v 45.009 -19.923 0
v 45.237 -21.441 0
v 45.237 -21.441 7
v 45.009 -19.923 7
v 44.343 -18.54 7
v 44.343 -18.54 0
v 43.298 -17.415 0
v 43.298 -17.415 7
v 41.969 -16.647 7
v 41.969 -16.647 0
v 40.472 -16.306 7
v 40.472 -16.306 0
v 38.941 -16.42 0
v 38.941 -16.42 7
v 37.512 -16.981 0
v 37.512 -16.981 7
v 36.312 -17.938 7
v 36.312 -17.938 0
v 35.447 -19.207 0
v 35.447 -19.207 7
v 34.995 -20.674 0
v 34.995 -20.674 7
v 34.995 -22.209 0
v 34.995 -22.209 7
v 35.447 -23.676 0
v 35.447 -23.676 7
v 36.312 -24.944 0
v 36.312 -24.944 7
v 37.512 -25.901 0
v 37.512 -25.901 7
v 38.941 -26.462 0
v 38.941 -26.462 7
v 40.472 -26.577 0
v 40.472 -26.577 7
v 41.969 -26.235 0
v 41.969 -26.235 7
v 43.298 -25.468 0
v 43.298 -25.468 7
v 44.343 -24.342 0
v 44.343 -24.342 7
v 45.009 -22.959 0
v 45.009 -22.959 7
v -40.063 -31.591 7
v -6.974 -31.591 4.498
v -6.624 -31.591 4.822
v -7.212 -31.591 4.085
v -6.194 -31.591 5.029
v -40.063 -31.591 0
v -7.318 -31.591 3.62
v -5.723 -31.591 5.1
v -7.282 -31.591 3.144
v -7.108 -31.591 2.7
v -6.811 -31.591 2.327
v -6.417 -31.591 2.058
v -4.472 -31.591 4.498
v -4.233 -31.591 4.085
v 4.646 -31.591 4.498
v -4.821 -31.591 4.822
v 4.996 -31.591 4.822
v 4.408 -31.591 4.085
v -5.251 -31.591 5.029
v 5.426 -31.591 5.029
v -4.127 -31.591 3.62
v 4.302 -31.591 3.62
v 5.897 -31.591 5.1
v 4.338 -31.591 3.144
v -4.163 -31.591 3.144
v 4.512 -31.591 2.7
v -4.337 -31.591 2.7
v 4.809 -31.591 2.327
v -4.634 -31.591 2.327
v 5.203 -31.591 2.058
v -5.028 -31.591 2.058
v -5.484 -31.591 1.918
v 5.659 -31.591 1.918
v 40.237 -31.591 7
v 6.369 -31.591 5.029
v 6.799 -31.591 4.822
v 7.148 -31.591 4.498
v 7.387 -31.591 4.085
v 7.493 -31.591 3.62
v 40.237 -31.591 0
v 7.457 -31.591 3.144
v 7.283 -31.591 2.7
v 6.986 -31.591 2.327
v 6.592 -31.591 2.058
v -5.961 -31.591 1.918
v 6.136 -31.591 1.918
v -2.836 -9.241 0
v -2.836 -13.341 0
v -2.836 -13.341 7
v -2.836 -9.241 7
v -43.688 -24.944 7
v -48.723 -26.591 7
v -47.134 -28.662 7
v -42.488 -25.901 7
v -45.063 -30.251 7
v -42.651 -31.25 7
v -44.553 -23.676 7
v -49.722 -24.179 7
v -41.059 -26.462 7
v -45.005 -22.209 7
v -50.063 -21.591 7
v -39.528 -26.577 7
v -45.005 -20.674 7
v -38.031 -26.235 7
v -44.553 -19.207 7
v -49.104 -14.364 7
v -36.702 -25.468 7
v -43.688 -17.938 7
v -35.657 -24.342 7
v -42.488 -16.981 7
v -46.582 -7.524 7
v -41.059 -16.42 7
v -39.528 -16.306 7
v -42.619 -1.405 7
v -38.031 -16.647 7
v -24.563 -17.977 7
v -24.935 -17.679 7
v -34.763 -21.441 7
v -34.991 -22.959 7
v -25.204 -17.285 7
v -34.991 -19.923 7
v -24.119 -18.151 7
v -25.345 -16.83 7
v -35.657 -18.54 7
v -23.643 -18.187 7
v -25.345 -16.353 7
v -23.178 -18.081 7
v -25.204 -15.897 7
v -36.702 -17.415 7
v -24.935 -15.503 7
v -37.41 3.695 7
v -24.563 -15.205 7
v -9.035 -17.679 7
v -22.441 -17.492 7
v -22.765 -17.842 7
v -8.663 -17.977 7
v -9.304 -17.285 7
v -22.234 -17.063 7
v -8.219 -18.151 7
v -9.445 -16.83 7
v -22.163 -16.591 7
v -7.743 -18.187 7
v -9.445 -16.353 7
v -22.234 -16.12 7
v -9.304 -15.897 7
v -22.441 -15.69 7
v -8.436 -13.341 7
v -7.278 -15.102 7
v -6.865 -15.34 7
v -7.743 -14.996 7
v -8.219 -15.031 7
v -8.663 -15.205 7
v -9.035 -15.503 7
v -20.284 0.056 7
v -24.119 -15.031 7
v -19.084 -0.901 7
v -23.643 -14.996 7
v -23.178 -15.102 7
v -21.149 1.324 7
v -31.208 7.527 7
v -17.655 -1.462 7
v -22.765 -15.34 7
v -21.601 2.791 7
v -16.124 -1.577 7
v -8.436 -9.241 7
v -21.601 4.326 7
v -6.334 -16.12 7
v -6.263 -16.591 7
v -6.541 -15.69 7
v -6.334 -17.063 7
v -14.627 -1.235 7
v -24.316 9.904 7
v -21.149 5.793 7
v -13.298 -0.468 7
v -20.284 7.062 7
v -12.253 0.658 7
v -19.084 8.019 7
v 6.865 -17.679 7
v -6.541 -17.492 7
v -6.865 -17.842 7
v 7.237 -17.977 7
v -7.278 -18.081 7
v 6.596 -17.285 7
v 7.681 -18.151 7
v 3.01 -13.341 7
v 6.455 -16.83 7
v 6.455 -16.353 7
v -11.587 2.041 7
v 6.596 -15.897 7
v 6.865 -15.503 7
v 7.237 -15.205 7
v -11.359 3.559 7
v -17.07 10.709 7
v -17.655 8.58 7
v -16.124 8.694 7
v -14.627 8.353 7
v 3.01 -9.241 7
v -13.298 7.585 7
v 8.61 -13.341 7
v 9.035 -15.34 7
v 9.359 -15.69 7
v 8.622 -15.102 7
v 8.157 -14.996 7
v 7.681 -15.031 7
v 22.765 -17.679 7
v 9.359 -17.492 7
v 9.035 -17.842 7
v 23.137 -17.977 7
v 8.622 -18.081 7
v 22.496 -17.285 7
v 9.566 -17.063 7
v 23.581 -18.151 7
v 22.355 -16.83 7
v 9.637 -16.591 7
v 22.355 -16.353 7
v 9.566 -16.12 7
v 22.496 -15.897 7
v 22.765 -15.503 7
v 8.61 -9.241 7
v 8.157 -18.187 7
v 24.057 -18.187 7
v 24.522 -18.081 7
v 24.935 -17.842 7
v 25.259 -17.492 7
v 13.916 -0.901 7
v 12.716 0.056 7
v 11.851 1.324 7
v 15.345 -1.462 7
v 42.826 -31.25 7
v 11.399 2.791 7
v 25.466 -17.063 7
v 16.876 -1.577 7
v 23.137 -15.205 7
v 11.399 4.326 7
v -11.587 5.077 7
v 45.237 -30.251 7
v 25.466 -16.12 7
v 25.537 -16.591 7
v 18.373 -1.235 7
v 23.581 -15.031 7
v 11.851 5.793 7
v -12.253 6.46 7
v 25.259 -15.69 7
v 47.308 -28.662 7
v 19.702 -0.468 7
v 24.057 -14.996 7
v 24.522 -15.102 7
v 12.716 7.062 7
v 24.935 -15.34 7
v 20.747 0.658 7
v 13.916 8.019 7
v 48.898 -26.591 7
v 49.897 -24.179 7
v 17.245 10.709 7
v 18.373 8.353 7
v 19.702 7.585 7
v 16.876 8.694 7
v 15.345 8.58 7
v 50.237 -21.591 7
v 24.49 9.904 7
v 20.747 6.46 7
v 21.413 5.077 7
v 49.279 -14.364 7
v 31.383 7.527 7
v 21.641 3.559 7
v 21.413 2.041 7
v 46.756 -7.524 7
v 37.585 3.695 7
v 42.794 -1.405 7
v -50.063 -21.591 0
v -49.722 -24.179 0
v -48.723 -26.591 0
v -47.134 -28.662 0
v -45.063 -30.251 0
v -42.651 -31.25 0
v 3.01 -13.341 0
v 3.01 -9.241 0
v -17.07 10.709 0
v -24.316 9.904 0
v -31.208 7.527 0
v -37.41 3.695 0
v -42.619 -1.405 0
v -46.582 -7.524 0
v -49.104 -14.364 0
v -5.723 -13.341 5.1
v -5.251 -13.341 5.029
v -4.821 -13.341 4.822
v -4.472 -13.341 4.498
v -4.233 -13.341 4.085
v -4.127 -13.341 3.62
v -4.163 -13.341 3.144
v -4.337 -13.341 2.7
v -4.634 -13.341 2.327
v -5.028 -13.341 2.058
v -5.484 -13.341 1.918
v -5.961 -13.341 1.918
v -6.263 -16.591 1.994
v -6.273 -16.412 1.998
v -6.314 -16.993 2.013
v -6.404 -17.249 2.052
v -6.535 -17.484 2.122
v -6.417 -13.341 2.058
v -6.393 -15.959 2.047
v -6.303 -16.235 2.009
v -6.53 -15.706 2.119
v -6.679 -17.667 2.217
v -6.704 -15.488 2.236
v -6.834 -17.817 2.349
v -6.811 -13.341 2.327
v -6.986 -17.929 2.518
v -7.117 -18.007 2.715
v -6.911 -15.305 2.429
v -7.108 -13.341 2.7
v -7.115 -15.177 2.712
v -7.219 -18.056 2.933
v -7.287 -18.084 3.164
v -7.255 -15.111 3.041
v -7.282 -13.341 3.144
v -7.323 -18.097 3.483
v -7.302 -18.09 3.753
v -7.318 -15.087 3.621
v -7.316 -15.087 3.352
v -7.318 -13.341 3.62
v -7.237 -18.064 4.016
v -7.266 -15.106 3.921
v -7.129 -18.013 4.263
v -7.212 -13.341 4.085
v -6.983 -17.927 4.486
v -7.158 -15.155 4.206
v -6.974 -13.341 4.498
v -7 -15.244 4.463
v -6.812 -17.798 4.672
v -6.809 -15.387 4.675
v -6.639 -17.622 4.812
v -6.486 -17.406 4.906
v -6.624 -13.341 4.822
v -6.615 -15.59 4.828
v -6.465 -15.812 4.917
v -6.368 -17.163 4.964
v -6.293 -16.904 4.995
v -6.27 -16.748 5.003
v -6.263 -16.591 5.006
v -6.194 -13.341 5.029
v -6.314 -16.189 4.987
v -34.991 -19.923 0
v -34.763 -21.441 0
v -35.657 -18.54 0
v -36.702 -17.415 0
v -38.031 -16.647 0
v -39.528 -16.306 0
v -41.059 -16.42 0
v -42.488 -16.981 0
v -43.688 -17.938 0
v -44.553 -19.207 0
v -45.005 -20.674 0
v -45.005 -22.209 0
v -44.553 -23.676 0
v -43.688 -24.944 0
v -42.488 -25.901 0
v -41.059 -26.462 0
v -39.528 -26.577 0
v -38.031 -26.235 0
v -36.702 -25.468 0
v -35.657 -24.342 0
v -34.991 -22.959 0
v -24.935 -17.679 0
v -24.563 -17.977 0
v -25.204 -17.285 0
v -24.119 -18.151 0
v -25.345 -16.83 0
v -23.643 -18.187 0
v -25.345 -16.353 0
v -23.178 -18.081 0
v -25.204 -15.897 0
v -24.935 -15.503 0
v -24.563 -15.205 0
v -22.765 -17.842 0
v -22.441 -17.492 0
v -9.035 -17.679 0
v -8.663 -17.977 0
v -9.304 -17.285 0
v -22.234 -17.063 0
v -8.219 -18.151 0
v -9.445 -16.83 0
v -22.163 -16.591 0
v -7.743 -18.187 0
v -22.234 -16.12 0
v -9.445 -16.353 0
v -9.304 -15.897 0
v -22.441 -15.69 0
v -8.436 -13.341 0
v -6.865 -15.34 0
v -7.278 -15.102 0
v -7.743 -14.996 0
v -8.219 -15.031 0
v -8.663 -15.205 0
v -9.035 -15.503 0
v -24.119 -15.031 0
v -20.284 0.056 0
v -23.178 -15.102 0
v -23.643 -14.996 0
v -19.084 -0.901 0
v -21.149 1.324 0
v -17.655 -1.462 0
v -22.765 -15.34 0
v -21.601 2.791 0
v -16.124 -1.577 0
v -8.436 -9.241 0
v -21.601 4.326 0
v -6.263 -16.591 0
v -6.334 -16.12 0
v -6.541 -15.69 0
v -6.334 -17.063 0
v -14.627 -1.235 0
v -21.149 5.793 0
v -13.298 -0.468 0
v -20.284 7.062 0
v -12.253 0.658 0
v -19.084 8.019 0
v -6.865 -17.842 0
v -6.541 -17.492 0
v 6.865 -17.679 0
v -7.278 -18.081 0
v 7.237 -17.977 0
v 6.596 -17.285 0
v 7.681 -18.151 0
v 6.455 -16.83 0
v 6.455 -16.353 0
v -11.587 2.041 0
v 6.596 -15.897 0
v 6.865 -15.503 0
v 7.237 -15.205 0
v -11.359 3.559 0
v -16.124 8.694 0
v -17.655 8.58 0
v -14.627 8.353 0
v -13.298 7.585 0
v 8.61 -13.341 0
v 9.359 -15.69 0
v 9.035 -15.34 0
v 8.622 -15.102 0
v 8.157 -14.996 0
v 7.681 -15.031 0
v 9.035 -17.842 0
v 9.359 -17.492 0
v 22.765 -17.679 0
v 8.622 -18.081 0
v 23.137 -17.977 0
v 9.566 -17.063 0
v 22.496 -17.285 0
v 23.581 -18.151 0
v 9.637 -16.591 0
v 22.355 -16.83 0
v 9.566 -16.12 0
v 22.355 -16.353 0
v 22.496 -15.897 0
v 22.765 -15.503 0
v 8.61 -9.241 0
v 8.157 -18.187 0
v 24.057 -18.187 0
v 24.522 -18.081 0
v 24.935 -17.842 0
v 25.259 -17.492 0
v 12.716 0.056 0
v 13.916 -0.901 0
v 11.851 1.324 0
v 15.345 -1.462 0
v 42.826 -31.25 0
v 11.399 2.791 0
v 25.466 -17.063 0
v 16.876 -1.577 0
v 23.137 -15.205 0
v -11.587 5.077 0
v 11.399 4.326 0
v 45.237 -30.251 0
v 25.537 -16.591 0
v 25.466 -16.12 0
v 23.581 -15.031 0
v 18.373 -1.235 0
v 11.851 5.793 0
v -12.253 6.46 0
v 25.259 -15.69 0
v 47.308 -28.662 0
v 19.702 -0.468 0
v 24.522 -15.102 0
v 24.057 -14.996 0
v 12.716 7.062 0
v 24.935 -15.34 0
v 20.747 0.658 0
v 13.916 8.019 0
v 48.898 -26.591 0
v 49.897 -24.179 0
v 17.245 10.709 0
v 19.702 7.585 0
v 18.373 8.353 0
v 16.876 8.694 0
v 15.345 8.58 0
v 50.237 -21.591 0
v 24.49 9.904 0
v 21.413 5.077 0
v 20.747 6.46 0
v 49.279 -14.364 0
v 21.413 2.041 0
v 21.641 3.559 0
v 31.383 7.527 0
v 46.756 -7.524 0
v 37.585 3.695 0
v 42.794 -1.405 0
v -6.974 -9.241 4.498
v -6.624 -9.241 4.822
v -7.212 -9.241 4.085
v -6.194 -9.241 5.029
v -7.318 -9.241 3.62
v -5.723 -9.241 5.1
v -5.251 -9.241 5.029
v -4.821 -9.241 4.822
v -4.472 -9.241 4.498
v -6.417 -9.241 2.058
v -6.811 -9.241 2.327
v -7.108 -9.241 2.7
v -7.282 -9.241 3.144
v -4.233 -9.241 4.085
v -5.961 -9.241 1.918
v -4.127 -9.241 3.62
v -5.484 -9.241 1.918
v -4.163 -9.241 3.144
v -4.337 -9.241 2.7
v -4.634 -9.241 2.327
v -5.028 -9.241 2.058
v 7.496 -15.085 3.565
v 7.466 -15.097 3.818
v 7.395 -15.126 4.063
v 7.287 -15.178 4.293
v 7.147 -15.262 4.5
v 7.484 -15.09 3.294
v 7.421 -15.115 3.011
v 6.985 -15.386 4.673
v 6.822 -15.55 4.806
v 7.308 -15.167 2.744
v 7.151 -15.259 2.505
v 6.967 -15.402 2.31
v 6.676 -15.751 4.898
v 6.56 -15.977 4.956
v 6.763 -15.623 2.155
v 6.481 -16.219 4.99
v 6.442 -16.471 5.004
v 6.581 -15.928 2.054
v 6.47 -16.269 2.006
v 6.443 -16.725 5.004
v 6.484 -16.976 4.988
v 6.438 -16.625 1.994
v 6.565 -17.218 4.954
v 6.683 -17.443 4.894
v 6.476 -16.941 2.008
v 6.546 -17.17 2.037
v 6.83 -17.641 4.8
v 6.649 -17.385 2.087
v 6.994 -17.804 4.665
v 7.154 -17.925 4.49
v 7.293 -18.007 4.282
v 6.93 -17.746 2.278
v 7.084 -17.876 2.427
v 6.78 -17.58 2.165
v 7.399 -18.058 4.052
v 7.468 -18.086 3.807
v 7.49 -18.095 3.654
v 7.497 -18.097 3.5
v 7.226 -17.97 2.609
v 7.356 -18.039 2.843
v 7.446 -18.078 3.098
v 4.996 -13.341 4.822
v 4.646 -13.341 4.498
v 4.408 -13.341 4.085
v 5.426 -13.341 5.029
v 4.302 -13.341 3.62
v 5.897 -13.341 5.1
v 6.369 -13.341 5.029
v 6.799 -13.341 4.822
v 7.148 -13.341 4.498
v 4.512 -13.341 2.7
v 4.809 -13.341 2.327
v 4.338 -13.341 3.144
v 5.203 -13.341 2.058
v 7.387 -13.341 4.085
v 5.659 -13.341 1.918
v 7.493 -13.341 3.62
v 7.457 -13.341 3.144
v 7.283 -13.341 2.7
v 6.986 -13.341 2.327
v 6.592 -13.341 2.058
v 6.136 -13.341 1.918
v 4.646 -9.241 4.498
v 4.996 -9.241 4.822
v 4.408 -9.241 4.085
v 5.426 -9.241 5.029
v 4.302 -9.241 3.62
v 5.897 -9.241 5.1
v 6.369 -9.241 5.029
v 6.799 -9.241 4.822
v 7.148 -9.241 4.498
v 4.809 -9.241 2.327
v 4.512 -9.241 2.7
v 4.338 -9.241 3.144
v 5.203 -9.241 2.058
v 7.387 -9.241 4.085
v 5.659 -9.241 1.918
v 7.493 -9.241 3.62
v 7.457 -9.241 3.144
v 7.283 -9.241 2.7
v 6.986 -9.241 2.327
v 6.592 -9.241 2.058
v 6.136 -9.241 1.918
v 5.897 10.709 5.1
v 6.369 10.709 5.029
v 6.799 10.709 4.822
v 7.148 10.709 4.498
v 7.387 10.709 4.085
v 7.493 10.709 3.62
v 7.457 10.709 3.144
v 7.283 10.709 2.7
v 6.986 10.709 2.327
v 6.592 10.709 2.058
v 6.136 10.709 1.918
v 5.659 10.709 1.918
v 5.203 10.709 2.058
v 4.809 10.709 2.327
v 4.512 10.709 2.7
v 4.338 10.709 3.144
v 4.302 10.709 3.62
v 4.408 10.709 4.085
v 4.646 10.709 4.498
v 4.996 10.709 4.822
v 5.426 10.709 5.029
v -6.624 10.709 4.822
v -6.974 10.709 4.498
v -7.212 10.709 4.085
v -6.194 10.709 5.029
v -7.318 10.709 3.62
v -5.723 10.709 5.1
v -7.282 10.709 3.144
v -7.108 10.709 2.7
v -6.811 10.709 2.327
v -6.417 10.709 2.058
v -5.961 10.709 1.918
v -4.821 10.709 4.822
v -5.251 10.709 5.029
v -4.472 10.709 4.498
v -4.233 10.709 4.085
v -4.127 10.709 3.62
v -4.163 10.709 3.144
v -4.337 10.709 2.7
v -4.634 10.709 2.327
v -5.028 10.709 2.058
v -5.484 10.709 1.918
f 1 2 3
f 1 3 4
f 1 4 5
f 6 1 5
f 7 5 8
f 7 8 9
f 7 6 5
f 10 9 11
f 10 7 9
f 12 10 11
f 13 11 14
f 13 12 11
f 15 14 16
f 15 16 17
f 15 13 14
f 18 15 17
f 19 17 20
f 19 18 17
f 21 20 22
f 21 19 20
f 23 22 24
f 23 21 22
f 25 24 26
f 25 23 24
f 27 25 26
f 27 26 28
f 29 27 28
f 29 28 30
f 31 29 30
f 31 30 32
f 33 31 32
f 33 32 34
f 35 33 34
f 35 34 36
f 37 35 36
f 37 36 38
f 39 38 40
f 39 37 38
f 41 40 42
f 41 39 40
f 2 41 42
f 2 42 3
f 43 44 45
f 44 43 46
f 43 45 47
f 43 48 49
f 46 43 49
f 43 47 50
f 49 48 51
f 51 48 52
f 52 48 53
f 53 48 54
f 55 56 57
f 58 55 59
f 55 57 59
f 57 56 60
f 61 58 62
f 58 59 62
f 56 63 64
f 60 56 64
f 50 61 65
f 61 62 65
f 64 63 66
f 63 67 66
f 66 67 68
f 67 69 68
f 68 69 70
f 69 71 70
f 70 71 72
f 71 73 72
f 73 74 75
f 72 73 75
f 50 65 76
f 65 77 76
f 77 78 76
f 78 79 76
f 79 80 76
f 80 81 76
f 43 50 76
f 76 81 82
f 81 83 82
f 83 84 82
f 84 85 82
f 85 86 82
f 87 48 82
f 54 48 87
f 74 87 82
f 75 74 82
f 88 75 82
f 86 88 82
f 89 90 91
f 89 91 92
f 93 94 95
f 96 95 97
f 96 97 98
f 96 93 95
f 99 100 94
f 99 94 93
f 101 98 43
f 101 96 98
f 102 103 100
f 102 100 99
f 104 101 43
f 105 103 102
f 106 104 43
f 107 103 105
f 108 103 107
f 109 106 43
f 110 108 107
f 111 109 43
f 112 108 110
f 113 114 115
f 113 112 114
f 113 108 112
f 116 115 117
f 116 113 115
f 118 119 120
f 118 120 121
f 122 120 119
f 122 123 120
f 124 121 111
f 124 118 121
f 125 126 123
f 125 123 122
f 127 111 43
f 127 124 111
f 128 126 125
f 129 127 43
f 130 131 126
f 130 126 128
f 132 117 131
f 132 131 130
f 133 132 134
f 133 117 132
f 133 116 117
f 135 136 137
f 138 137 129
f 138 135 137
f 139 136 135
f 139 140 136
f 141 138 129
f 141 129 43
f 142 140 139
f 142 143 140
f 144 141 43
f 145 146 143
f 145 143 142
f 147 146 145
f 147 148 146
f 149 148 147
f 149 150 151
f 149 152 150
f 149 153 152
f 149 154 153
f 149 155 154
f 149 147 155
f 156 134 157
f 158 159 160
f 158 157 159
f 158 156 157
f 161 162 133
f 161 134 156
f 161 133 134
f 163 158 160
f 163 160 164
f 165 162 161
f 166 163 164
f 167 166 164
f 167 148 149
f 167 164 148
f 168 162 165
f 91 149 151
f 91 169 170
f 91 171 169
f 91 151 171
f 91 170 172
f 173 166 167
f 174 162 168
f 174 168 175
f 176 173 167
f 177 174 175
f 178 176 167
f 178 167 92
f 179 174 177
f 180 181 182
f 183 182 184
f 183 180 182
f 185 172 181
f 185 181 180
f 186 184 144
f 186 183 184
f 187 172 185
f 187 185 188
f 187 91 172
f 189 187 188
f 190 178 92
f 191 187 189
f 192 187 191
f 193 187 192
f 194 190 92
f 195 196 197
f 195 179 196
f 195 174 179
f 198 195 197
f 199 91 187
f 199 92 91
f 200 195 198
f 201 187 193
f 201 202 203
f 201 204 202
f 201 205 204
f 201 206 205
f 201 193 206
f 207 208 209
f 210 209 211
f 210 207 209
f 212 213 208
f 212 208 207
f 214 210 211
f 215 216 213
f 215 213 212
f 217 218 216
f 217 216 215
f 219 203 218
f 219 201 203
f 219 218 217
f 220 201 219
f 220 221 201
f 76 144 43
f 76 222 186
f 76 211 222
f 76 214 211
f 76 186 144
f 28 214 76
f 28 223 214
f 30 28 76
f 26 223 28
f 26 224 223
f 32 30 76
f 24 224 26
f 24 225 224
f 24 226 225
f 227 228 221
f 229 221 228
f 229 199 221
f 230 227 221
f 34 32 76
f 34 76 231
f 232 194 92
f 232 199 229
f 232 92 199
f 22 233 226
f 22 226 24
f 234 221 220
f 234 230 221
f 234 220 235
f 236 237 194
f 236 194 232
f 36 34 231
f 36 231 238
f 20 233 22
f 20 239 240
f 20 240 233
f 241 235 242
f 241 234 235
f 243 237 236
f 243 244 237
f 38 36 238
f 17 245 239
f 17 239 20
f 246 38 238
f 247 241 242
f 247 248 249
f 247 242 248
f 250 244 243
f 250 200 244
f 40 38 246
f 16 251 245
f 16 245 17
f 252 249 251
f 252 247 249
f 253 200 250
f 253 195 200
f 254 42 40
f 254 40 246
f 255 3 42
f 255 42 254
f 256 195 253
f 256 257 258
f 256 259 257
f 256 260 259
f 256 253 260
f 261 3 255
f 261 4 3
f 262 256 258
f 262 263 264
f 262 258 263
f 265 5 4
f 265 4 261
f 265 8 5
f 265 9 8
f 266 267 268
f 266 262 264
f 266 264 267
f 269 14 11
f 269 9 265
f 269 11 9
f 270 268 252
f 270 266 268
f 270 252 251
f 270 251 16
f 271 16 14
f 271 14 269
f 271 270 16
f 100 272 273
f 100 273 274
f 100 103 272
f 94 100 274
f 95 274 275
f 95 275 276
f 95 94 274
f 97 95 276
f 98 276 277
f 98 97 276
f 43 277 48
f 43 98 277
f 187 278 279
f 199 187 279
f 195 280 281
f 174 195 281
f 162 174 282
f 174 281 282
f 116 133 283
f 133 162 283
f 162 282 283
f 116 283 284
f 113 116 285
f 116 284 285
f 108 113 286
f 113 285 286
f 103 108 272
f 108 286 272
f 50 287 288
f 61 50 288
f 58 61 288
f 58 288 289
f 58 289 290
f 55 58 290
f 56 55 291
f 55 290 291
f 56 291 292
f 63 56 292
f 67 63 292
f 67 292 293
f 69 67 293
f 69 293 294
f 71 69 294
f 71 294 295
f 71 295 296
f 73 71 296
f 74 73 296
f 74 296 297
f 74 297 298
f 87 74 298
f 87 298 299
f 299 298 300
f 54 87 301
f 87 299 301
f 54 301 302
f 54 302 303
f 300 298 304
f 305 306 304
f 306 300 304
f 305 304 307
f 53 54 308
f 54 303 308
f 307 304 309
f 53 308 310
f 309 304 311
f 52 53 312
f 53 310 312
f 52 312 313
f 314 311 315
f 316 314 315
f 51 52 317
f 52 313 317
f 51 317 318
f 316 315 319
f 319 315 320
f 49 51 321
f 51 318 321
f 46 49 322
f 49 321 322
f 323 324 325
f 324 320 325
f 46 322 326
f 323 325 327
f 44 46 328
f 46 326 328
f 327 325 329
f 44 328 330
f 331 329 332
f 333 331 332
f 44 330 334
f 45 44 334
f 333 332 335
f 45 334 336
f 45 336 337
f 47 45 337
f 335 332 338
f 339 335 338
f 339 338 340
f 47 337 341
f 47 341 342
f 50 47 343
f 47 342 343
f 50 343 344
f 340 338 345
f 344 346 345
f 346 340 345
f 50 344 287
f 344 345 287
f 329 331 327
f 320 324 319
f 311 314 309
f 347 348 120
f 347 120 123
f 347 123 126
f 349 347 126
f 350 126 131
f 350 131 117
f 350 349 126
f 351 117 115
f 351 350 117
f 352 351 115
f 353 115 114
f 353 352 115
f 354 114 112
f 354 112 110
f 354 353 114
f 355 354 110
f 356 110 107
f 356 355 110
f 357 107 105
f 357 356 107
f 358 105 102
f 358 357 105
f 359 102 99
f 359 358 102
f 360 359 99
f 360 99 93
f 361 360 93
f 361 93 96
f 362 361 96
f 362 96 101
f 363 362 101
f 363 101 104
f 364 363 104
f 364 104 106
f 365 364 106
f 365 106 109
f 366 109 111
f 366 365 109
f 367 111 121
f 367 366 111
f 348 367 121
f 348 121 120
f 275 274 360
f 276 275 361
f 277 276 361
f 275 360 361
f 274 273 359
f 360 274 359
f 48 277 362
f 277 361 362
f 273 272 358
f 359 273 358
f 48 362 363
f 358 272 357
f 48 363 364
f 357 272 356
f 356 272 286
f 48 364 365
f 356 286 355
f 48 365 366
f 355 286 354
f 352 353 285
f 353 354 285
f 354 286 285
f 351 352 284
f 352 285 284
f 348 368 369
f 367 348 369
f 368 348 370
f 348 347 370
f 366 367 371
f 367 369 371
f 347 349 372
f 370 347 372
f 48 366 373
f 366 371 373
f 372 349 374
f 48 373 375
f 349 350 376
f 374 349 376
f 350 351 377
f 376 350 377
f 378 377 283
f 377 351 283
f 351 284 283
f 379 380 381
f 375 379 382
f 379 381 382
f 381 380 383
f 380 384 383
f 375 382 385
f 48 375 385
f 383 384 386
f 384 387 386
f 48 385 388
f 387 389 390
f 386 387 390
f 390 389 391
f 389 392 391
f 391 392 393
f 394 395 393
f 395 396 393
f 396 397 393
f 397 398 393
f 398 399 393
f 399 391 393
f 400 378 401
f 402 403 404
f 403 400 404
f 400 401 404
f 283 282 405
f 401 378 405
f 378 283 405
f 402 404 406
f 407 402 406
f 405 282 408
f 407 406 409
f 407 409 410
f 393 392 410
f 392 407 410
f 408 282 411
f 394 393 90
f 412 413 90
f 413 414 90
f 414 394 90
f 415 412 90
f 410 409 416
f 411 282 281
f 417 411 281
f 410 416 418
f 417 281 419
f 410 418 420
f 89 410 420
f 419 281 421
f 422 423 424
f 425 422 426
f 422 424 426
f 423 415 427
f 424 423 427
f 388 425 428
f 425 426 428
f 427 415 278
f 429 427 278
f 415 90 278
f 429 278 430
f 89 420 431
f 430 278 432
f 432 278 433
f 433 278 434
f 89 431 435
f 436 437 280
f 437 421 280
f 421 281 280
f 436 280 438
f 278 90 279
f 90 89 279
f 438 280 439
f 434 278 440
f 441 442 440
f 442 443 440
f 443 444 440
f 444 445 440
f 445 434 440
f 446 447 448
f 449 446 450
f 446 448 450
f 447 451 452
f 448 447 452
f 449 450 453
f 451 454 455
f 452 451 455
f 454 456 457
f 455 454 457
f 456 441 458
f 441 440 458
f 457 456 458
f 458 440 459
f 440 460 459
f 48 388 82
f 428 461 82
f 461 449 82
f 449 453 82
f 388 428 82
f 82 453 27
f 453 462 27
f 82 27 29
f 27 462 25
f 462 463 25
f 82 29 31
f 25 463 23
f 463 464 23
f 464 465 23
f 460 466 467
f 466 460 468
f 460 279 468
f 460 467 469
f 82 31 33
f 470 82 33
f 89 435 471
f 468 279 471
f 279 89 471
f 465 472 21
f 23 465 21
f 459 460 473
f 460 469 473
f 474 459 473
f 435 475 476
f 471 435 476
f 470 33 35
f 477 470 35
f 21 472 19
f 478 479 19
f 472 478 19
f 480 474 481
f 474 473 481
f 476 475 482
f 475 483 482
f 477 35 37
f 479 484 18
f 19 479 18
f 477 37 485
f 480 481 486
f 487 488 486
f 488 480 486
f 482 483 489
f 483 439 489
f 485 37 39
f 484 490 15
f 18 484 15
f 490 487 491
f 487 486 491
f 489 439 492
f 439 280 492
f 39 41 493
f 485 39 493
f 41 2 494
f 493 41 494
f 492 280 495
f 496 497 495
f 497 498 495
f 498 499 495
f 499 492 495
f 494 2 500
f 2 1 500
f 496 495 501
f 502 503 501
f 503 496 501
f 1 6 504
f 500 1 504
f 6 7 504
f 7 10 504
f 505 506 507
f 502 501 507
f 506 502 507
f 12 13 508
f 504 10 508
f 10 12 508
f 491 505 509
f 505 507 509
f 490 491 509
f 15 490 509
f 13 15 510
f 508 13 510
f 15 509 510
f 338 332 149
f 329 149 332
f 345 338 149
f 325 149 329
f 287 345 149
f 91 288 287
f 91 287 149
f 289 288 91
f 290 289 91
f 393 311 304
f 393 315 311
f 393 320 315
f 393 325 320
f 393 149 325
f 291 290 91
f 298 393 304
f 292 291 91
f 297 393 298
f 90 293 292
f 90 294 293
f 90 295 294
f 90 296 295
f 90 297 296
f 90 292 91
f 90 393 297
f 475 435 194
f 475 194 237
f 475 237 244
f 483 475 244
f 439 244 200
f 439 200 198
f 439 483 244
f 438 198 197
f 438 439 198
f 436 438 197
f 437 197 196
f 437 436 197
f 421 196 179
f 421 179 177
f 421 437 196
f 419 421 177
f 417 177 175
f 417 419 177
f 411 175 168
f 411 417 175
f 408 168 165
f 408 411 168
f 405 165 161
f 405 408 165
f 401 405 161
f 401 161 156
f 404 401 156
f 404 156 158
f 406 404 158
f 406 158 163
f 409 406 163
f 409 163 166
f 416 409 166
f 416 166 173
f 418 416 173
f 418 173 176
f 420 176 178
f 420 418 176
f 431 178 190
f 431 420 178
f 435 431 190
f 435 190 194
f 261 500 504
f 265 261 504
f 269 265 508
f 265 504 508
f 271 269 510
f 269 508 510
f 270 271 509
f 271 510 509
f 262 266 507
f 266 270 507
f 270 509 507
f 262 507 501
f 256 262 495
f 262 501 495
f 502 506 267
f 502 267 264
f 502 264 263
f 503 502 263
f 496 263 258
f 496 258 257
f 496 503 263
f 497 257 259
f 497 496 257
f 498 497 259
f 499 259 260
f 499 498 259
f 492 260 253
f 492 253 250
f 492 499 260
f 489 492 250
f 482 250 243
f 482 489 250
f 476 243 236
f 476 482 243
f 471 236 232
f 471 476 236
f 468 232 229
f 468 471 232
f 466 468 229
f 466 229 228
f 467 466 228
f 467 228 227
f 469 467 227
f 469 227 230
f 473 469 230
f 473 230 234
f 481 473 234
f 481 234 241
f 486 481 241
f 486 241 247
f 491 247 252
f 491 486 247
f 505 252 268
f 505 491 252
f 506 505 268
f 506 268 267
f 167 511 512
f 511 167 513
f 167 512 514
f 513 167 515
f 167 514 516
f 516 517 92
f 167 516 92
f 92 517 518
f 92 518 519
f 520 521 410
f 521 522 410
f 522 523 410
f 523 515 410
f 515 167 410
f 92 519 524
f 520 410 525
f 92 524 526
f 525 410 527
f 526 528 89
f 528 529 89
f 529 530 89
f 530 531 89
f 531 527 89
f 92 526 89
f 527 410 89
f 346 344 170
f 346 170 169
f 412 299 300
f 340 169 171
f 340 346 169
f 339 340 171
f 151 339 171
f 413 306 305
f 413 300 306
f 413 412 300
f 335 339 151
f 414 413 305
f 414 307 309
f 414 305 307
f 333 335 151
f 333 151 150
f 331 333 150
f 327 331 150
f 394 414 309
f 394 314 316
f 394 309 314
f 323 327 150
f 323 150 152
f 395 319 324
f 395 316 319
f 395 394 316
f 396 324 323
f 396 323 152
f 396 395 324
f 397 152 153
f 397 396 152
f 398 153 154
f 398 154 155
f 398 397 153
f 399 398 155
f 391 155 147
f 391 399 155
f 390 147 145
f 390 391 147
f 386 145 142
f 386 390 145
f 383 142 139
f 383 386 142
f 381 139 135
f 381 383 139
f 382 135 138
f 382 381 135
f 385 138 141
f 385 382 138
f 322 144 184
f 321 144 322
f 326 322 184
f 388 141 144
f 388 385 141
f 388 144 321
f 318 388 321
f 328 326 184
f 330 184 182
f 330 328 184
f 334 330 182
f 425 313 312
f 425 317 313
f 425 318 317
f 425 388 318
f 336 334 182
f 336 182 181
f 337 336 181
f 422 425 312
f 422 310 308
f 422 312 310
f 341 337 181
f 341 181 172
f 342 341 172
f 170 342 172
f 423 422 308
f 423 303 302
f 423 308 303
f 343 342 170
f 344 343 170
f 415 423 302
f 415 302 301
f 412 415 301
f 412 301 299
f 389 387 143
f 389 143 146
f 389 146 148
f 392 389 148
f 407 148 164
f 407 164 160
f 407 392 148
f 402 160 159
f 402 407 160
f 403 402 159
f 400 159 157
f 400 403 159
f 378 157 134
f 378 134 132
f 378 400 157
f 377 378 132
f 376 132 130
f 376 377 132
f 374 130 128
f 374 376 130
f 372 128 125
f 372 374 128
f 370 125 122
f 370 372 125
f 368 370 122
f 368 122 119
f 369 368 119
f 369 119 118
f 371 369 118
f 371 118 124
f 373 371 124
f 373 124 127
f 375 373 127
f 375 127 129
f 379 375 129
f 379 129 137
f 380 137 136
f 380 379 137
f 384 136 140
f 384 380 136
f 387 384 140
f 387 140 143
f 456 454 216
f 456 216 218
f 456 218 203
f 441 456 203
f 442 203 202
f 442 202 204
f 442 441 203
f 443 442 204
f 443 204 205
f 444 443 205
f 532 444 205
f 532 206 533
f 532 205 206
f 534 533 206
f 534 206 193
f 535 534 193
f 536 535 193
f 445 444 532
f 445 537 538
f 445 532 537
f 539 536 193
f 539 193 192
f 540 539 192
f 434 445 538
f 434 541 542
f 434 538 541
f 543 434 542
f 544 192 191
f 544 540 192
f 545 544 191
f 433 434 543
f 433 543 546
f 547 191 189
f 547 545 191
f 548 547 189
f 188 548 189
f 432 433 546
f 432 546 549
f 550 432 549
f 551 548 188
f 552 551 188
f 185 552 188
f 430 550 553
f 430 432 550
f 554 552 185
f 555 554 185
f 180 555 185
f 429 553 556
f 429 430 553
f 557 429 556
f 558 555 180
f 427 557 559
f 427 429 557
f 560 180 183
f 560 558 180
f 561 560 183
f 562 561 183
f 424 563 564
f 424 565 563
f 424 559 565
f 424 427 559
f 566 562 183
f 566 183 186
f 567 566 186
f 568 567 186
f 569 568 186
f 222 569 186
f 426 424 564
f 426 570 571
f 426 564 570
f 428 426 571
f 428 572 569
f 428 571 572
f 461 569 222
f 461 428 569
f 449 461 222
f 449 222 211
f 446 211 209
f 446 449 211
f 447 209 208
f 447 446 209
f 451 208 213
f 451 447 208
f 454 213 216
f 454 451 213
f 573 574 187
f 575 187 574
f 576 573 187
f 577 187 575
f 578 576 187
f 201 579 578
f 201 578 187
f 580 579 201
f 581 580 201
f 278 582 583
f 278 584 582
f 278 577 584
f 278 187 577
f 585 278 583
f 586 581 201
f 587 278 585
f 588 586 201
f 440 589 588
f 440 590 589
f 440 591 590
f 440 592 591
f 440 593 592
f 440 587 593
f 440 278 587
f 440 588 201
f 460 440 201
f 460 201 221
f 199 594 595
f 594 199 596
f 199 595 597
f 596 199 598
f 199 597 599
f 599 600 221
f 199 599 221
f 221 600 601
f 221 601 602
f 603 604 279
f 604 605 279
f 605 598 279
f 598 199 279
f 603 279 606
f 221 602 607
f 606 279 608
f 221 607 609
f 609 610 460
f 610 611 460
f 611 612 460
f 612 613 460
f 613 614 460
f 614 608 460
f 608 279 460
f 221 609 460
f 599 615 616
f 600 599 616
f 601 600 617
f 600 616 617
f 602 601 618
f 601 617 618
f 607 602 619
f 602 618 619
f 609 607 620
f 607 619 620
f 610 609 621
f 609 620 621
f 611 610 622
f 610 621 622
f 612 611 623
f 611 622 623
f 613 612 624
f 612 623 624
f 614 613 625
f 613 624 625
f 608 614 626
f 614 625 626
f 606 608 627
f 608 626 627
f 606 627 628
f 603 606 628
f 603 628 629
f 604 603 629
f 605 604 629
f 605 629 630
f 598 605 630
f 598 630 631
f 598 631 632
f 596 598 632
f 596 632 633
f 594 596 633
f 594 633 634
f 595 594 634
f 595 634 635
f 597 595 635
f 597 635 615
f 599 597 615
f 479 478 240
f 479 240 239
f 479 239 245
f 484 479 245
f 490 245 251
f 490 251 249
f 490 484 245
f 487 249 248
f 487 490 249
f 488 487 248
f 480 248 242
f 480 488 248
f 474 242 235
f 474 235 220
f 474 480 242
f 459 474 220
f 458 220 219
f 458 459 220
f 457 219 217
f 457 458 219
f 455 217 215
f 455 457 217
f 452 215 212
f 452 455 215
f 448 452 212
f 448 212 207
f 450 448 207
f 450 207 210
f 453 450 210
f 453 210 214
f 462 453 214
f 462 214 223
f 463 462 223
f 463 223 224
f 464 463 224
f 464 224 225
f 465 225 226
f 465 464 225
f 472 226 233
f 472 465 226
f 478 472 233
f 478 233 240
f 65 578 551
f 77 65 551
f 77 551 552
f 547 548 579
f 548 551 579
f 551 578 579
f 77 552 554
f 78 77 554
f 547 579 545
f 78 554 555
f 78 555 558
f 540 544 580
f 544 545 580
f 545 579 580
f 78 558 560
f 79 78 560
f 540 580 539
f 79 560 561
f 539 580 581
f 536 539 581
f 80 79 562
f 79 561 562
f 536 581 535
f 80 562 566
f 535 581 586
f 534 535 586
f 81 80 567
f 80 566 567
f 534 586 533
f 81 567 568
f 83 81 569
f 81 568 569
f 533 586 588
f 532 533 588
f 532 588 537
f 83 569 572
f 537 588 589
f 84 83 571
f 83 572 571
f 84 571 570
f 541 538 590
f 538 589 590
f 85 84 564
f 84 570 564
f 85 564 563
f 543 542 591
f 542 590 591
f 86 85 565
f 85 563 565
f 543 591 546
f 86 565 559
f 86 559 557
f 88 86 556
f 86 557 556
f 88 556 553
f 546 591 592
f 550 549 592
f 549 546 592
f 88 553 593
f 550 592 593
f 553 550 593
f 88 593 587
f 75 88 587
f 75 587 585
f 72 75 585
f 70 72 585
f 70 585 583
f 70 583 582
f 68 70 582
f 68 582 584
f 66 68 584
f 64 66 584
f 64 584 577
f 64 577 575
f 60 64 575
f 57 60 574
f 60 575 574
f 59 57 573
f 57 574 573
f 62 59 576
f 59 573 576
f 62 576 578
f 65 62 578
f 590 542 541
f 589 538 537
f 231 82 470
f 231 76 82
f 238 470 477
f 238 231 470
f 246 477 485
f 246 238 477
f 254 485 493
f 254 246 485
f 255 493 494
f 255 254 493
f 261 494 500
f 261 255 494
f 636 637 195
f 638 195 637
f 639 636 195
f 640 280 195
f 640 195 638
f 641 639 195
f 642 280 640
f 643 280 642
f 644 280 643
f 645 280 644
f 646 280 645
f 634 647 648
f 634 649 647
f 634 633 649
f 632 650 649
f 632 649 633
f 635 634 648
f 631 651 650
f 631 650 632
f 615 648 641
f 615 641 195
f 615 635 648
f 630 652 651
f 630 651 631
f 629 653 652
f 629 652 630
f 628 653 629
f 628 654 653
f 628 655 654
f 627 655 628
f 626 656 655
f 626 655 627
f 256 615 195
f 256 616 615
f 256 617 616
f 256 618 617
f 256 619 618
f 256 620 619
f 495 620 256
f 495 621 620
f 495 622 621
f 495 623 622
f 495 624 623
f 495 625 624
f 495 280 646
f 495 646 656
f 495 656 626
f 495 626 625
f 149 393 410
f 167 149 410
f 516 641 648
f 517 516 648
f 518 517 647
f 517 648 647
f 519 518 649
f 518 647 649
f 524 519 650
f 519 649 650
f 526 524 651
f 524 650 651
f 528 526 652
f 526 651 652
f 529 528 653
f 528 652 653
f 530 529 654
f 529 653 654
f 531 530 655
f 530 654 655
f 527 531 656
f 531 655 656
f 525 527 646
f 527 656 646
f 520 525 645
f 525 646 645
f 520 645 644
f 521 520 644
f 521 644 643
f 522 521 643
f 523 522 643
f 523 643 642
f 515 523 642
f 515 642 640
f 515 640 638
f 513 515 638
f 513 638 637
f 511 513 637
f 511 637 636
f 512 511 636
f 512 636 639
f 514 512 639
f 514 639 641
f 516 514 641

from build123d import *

# Parameters (mm, degrees)
ESBO_O1_W                = 100.3
ESBO_O1_H                = 42.3
ESBO_O1_R                = 5.15
ESBO_O1_R_2              = 1.6
ESBO_O1_W_2              = 5.6
ESBO_O1_H_2              = 4.1
RESSALTO_EXTRUS_O1_DEPTH = 7
FILETE1_R                = 10
ESBO_O4_R                = 1.6
CORTE_EXTRUS_O3_DEPTH    = 67.046091306
FILETE3_R                = 33


with BuildPart() as part:
    # Esboço1 → Ressalto-extrusão1 (new body)
    with BuildSketch(Plane.XY):
        with Locations((0.087398189, -10.441132561)):
            Rectangle(ESBO_O1_W, ESBO_O1_H)
        with Locations((-16.508590221, 3.558867439)):
            Circle(ESBO_O1_R, mode=Mode.SUBTRACT)
        with Locations((16.491409779, 3.558867439)):
            Circle(ESBO_O1_R, mode=Mode.SUBTRACT)
        with Locations((-39.912601811, -21.441132561)):
            Circle(ESBO_O1_R, mode=Mode.SUBTRACT)
        with Locations((40.087398189, -21.441132561)):
            Circle(ESBO_O1_R, mode=Mode.SUBTRACT)
        with Locations((8.037398189, -16.591132561)):
            Circle(ESBO_O1_R_2, mode=Mode.SUBTRACT)
        with Locations((23.937398189, -16.591132561)):
            Circle(ESBO_O1_R_2, mode=Mode.SUBTRACT)
        with Locations((-7.862601811, -16.591132561)):
            Circle(ESBO_O1_R_2, mode=Mode.SUBTRACT)
        with Locations((-23.762601811, -16.591132561)):
            Circle(ESBO_O1_R_2, mode=Mode.SUBTRACT)
        with Locations((-5.635596016, -11.291132561)):
            Rectangle(ESBO_O1_W_2, ESBO_O1_H_2, mode=Mode.SUBTRACT)
        with Locations((5.810392394, -11.291132561)):
            Rectangle(ESBO_O1_W_2, ESBO_O1_H_2, mode=Mode.SUBTRACT)
    extrude(amount=RESSALTO_EXTRUS_O1_DEPTH)

    # Filete1
    filete1_edges = [part.edges().sort_by_distance(p)[0] for p in [
        (50.237398189, -31.591132561, 3.5),
        (-50.062601811, -31.591132561, 3.5),
    ]]
    fillet(filete1_edges, radius=FILETE1_R)

    # Esboço4 → Corte-extrusão3 (cut, through all)
    with BuildSketch(Plane(origin=(0, 10.708867439, 0), x_dir=(1, 0, 0), z_dir=(0, 1, 0))):
        with Locations(Location((-5.722601811, -3.5, 0), (0, 0, 270))):
            Circle(ESBO_O4_R)
        with Locations(Location((5.897398189, -3.5, 0), (0, 0, 270))):
            Circle(ESBO_O4_R)
    extrude(amount=-CORTE_EXTRUS_O3_DEPTH, mode=Mode.SUBTRACT)

    # Filete3
    # the kernel refuses this fillet: 33 mm, written as the material it takes off along each edge
    with BuildSketch(Plane(origin=(50.237398189, 10.708867439, -82.481437306), x_dir=(0, -1, 0), z_dir=(0, 0, 1))) as filete3_piece_1:
        with BuildLine():
            CenterArc((33, -32.992574922), FILETE3_R, 91.215456182, 88.784543818)
            Line((0, -32.992574922), (0, 0))
            Line((0, 0), (32.3, 0))
        make_face()
    extrude(amount=171.962874611, mode=Mode.SUBTRACT)
    with BuildSketch(Plane(origin=(-50.062601811, 10.708867439, -82.481437306), x_dir=(0, -1, 0), z_dir=(0, 0, 1))) as filete3_piece_2:
        with BuildLine():
            CenterArc((33, 32.992574922), FILETE3_R, 180, 88.784543818)
            Line((0, 32.992574922), (0, 0))
            Line((0, 0), (32.3, 0))
        make_face()
    extrude(amount=171.962874611, mode=Mode.SUBTRACT)


solid = part.part
